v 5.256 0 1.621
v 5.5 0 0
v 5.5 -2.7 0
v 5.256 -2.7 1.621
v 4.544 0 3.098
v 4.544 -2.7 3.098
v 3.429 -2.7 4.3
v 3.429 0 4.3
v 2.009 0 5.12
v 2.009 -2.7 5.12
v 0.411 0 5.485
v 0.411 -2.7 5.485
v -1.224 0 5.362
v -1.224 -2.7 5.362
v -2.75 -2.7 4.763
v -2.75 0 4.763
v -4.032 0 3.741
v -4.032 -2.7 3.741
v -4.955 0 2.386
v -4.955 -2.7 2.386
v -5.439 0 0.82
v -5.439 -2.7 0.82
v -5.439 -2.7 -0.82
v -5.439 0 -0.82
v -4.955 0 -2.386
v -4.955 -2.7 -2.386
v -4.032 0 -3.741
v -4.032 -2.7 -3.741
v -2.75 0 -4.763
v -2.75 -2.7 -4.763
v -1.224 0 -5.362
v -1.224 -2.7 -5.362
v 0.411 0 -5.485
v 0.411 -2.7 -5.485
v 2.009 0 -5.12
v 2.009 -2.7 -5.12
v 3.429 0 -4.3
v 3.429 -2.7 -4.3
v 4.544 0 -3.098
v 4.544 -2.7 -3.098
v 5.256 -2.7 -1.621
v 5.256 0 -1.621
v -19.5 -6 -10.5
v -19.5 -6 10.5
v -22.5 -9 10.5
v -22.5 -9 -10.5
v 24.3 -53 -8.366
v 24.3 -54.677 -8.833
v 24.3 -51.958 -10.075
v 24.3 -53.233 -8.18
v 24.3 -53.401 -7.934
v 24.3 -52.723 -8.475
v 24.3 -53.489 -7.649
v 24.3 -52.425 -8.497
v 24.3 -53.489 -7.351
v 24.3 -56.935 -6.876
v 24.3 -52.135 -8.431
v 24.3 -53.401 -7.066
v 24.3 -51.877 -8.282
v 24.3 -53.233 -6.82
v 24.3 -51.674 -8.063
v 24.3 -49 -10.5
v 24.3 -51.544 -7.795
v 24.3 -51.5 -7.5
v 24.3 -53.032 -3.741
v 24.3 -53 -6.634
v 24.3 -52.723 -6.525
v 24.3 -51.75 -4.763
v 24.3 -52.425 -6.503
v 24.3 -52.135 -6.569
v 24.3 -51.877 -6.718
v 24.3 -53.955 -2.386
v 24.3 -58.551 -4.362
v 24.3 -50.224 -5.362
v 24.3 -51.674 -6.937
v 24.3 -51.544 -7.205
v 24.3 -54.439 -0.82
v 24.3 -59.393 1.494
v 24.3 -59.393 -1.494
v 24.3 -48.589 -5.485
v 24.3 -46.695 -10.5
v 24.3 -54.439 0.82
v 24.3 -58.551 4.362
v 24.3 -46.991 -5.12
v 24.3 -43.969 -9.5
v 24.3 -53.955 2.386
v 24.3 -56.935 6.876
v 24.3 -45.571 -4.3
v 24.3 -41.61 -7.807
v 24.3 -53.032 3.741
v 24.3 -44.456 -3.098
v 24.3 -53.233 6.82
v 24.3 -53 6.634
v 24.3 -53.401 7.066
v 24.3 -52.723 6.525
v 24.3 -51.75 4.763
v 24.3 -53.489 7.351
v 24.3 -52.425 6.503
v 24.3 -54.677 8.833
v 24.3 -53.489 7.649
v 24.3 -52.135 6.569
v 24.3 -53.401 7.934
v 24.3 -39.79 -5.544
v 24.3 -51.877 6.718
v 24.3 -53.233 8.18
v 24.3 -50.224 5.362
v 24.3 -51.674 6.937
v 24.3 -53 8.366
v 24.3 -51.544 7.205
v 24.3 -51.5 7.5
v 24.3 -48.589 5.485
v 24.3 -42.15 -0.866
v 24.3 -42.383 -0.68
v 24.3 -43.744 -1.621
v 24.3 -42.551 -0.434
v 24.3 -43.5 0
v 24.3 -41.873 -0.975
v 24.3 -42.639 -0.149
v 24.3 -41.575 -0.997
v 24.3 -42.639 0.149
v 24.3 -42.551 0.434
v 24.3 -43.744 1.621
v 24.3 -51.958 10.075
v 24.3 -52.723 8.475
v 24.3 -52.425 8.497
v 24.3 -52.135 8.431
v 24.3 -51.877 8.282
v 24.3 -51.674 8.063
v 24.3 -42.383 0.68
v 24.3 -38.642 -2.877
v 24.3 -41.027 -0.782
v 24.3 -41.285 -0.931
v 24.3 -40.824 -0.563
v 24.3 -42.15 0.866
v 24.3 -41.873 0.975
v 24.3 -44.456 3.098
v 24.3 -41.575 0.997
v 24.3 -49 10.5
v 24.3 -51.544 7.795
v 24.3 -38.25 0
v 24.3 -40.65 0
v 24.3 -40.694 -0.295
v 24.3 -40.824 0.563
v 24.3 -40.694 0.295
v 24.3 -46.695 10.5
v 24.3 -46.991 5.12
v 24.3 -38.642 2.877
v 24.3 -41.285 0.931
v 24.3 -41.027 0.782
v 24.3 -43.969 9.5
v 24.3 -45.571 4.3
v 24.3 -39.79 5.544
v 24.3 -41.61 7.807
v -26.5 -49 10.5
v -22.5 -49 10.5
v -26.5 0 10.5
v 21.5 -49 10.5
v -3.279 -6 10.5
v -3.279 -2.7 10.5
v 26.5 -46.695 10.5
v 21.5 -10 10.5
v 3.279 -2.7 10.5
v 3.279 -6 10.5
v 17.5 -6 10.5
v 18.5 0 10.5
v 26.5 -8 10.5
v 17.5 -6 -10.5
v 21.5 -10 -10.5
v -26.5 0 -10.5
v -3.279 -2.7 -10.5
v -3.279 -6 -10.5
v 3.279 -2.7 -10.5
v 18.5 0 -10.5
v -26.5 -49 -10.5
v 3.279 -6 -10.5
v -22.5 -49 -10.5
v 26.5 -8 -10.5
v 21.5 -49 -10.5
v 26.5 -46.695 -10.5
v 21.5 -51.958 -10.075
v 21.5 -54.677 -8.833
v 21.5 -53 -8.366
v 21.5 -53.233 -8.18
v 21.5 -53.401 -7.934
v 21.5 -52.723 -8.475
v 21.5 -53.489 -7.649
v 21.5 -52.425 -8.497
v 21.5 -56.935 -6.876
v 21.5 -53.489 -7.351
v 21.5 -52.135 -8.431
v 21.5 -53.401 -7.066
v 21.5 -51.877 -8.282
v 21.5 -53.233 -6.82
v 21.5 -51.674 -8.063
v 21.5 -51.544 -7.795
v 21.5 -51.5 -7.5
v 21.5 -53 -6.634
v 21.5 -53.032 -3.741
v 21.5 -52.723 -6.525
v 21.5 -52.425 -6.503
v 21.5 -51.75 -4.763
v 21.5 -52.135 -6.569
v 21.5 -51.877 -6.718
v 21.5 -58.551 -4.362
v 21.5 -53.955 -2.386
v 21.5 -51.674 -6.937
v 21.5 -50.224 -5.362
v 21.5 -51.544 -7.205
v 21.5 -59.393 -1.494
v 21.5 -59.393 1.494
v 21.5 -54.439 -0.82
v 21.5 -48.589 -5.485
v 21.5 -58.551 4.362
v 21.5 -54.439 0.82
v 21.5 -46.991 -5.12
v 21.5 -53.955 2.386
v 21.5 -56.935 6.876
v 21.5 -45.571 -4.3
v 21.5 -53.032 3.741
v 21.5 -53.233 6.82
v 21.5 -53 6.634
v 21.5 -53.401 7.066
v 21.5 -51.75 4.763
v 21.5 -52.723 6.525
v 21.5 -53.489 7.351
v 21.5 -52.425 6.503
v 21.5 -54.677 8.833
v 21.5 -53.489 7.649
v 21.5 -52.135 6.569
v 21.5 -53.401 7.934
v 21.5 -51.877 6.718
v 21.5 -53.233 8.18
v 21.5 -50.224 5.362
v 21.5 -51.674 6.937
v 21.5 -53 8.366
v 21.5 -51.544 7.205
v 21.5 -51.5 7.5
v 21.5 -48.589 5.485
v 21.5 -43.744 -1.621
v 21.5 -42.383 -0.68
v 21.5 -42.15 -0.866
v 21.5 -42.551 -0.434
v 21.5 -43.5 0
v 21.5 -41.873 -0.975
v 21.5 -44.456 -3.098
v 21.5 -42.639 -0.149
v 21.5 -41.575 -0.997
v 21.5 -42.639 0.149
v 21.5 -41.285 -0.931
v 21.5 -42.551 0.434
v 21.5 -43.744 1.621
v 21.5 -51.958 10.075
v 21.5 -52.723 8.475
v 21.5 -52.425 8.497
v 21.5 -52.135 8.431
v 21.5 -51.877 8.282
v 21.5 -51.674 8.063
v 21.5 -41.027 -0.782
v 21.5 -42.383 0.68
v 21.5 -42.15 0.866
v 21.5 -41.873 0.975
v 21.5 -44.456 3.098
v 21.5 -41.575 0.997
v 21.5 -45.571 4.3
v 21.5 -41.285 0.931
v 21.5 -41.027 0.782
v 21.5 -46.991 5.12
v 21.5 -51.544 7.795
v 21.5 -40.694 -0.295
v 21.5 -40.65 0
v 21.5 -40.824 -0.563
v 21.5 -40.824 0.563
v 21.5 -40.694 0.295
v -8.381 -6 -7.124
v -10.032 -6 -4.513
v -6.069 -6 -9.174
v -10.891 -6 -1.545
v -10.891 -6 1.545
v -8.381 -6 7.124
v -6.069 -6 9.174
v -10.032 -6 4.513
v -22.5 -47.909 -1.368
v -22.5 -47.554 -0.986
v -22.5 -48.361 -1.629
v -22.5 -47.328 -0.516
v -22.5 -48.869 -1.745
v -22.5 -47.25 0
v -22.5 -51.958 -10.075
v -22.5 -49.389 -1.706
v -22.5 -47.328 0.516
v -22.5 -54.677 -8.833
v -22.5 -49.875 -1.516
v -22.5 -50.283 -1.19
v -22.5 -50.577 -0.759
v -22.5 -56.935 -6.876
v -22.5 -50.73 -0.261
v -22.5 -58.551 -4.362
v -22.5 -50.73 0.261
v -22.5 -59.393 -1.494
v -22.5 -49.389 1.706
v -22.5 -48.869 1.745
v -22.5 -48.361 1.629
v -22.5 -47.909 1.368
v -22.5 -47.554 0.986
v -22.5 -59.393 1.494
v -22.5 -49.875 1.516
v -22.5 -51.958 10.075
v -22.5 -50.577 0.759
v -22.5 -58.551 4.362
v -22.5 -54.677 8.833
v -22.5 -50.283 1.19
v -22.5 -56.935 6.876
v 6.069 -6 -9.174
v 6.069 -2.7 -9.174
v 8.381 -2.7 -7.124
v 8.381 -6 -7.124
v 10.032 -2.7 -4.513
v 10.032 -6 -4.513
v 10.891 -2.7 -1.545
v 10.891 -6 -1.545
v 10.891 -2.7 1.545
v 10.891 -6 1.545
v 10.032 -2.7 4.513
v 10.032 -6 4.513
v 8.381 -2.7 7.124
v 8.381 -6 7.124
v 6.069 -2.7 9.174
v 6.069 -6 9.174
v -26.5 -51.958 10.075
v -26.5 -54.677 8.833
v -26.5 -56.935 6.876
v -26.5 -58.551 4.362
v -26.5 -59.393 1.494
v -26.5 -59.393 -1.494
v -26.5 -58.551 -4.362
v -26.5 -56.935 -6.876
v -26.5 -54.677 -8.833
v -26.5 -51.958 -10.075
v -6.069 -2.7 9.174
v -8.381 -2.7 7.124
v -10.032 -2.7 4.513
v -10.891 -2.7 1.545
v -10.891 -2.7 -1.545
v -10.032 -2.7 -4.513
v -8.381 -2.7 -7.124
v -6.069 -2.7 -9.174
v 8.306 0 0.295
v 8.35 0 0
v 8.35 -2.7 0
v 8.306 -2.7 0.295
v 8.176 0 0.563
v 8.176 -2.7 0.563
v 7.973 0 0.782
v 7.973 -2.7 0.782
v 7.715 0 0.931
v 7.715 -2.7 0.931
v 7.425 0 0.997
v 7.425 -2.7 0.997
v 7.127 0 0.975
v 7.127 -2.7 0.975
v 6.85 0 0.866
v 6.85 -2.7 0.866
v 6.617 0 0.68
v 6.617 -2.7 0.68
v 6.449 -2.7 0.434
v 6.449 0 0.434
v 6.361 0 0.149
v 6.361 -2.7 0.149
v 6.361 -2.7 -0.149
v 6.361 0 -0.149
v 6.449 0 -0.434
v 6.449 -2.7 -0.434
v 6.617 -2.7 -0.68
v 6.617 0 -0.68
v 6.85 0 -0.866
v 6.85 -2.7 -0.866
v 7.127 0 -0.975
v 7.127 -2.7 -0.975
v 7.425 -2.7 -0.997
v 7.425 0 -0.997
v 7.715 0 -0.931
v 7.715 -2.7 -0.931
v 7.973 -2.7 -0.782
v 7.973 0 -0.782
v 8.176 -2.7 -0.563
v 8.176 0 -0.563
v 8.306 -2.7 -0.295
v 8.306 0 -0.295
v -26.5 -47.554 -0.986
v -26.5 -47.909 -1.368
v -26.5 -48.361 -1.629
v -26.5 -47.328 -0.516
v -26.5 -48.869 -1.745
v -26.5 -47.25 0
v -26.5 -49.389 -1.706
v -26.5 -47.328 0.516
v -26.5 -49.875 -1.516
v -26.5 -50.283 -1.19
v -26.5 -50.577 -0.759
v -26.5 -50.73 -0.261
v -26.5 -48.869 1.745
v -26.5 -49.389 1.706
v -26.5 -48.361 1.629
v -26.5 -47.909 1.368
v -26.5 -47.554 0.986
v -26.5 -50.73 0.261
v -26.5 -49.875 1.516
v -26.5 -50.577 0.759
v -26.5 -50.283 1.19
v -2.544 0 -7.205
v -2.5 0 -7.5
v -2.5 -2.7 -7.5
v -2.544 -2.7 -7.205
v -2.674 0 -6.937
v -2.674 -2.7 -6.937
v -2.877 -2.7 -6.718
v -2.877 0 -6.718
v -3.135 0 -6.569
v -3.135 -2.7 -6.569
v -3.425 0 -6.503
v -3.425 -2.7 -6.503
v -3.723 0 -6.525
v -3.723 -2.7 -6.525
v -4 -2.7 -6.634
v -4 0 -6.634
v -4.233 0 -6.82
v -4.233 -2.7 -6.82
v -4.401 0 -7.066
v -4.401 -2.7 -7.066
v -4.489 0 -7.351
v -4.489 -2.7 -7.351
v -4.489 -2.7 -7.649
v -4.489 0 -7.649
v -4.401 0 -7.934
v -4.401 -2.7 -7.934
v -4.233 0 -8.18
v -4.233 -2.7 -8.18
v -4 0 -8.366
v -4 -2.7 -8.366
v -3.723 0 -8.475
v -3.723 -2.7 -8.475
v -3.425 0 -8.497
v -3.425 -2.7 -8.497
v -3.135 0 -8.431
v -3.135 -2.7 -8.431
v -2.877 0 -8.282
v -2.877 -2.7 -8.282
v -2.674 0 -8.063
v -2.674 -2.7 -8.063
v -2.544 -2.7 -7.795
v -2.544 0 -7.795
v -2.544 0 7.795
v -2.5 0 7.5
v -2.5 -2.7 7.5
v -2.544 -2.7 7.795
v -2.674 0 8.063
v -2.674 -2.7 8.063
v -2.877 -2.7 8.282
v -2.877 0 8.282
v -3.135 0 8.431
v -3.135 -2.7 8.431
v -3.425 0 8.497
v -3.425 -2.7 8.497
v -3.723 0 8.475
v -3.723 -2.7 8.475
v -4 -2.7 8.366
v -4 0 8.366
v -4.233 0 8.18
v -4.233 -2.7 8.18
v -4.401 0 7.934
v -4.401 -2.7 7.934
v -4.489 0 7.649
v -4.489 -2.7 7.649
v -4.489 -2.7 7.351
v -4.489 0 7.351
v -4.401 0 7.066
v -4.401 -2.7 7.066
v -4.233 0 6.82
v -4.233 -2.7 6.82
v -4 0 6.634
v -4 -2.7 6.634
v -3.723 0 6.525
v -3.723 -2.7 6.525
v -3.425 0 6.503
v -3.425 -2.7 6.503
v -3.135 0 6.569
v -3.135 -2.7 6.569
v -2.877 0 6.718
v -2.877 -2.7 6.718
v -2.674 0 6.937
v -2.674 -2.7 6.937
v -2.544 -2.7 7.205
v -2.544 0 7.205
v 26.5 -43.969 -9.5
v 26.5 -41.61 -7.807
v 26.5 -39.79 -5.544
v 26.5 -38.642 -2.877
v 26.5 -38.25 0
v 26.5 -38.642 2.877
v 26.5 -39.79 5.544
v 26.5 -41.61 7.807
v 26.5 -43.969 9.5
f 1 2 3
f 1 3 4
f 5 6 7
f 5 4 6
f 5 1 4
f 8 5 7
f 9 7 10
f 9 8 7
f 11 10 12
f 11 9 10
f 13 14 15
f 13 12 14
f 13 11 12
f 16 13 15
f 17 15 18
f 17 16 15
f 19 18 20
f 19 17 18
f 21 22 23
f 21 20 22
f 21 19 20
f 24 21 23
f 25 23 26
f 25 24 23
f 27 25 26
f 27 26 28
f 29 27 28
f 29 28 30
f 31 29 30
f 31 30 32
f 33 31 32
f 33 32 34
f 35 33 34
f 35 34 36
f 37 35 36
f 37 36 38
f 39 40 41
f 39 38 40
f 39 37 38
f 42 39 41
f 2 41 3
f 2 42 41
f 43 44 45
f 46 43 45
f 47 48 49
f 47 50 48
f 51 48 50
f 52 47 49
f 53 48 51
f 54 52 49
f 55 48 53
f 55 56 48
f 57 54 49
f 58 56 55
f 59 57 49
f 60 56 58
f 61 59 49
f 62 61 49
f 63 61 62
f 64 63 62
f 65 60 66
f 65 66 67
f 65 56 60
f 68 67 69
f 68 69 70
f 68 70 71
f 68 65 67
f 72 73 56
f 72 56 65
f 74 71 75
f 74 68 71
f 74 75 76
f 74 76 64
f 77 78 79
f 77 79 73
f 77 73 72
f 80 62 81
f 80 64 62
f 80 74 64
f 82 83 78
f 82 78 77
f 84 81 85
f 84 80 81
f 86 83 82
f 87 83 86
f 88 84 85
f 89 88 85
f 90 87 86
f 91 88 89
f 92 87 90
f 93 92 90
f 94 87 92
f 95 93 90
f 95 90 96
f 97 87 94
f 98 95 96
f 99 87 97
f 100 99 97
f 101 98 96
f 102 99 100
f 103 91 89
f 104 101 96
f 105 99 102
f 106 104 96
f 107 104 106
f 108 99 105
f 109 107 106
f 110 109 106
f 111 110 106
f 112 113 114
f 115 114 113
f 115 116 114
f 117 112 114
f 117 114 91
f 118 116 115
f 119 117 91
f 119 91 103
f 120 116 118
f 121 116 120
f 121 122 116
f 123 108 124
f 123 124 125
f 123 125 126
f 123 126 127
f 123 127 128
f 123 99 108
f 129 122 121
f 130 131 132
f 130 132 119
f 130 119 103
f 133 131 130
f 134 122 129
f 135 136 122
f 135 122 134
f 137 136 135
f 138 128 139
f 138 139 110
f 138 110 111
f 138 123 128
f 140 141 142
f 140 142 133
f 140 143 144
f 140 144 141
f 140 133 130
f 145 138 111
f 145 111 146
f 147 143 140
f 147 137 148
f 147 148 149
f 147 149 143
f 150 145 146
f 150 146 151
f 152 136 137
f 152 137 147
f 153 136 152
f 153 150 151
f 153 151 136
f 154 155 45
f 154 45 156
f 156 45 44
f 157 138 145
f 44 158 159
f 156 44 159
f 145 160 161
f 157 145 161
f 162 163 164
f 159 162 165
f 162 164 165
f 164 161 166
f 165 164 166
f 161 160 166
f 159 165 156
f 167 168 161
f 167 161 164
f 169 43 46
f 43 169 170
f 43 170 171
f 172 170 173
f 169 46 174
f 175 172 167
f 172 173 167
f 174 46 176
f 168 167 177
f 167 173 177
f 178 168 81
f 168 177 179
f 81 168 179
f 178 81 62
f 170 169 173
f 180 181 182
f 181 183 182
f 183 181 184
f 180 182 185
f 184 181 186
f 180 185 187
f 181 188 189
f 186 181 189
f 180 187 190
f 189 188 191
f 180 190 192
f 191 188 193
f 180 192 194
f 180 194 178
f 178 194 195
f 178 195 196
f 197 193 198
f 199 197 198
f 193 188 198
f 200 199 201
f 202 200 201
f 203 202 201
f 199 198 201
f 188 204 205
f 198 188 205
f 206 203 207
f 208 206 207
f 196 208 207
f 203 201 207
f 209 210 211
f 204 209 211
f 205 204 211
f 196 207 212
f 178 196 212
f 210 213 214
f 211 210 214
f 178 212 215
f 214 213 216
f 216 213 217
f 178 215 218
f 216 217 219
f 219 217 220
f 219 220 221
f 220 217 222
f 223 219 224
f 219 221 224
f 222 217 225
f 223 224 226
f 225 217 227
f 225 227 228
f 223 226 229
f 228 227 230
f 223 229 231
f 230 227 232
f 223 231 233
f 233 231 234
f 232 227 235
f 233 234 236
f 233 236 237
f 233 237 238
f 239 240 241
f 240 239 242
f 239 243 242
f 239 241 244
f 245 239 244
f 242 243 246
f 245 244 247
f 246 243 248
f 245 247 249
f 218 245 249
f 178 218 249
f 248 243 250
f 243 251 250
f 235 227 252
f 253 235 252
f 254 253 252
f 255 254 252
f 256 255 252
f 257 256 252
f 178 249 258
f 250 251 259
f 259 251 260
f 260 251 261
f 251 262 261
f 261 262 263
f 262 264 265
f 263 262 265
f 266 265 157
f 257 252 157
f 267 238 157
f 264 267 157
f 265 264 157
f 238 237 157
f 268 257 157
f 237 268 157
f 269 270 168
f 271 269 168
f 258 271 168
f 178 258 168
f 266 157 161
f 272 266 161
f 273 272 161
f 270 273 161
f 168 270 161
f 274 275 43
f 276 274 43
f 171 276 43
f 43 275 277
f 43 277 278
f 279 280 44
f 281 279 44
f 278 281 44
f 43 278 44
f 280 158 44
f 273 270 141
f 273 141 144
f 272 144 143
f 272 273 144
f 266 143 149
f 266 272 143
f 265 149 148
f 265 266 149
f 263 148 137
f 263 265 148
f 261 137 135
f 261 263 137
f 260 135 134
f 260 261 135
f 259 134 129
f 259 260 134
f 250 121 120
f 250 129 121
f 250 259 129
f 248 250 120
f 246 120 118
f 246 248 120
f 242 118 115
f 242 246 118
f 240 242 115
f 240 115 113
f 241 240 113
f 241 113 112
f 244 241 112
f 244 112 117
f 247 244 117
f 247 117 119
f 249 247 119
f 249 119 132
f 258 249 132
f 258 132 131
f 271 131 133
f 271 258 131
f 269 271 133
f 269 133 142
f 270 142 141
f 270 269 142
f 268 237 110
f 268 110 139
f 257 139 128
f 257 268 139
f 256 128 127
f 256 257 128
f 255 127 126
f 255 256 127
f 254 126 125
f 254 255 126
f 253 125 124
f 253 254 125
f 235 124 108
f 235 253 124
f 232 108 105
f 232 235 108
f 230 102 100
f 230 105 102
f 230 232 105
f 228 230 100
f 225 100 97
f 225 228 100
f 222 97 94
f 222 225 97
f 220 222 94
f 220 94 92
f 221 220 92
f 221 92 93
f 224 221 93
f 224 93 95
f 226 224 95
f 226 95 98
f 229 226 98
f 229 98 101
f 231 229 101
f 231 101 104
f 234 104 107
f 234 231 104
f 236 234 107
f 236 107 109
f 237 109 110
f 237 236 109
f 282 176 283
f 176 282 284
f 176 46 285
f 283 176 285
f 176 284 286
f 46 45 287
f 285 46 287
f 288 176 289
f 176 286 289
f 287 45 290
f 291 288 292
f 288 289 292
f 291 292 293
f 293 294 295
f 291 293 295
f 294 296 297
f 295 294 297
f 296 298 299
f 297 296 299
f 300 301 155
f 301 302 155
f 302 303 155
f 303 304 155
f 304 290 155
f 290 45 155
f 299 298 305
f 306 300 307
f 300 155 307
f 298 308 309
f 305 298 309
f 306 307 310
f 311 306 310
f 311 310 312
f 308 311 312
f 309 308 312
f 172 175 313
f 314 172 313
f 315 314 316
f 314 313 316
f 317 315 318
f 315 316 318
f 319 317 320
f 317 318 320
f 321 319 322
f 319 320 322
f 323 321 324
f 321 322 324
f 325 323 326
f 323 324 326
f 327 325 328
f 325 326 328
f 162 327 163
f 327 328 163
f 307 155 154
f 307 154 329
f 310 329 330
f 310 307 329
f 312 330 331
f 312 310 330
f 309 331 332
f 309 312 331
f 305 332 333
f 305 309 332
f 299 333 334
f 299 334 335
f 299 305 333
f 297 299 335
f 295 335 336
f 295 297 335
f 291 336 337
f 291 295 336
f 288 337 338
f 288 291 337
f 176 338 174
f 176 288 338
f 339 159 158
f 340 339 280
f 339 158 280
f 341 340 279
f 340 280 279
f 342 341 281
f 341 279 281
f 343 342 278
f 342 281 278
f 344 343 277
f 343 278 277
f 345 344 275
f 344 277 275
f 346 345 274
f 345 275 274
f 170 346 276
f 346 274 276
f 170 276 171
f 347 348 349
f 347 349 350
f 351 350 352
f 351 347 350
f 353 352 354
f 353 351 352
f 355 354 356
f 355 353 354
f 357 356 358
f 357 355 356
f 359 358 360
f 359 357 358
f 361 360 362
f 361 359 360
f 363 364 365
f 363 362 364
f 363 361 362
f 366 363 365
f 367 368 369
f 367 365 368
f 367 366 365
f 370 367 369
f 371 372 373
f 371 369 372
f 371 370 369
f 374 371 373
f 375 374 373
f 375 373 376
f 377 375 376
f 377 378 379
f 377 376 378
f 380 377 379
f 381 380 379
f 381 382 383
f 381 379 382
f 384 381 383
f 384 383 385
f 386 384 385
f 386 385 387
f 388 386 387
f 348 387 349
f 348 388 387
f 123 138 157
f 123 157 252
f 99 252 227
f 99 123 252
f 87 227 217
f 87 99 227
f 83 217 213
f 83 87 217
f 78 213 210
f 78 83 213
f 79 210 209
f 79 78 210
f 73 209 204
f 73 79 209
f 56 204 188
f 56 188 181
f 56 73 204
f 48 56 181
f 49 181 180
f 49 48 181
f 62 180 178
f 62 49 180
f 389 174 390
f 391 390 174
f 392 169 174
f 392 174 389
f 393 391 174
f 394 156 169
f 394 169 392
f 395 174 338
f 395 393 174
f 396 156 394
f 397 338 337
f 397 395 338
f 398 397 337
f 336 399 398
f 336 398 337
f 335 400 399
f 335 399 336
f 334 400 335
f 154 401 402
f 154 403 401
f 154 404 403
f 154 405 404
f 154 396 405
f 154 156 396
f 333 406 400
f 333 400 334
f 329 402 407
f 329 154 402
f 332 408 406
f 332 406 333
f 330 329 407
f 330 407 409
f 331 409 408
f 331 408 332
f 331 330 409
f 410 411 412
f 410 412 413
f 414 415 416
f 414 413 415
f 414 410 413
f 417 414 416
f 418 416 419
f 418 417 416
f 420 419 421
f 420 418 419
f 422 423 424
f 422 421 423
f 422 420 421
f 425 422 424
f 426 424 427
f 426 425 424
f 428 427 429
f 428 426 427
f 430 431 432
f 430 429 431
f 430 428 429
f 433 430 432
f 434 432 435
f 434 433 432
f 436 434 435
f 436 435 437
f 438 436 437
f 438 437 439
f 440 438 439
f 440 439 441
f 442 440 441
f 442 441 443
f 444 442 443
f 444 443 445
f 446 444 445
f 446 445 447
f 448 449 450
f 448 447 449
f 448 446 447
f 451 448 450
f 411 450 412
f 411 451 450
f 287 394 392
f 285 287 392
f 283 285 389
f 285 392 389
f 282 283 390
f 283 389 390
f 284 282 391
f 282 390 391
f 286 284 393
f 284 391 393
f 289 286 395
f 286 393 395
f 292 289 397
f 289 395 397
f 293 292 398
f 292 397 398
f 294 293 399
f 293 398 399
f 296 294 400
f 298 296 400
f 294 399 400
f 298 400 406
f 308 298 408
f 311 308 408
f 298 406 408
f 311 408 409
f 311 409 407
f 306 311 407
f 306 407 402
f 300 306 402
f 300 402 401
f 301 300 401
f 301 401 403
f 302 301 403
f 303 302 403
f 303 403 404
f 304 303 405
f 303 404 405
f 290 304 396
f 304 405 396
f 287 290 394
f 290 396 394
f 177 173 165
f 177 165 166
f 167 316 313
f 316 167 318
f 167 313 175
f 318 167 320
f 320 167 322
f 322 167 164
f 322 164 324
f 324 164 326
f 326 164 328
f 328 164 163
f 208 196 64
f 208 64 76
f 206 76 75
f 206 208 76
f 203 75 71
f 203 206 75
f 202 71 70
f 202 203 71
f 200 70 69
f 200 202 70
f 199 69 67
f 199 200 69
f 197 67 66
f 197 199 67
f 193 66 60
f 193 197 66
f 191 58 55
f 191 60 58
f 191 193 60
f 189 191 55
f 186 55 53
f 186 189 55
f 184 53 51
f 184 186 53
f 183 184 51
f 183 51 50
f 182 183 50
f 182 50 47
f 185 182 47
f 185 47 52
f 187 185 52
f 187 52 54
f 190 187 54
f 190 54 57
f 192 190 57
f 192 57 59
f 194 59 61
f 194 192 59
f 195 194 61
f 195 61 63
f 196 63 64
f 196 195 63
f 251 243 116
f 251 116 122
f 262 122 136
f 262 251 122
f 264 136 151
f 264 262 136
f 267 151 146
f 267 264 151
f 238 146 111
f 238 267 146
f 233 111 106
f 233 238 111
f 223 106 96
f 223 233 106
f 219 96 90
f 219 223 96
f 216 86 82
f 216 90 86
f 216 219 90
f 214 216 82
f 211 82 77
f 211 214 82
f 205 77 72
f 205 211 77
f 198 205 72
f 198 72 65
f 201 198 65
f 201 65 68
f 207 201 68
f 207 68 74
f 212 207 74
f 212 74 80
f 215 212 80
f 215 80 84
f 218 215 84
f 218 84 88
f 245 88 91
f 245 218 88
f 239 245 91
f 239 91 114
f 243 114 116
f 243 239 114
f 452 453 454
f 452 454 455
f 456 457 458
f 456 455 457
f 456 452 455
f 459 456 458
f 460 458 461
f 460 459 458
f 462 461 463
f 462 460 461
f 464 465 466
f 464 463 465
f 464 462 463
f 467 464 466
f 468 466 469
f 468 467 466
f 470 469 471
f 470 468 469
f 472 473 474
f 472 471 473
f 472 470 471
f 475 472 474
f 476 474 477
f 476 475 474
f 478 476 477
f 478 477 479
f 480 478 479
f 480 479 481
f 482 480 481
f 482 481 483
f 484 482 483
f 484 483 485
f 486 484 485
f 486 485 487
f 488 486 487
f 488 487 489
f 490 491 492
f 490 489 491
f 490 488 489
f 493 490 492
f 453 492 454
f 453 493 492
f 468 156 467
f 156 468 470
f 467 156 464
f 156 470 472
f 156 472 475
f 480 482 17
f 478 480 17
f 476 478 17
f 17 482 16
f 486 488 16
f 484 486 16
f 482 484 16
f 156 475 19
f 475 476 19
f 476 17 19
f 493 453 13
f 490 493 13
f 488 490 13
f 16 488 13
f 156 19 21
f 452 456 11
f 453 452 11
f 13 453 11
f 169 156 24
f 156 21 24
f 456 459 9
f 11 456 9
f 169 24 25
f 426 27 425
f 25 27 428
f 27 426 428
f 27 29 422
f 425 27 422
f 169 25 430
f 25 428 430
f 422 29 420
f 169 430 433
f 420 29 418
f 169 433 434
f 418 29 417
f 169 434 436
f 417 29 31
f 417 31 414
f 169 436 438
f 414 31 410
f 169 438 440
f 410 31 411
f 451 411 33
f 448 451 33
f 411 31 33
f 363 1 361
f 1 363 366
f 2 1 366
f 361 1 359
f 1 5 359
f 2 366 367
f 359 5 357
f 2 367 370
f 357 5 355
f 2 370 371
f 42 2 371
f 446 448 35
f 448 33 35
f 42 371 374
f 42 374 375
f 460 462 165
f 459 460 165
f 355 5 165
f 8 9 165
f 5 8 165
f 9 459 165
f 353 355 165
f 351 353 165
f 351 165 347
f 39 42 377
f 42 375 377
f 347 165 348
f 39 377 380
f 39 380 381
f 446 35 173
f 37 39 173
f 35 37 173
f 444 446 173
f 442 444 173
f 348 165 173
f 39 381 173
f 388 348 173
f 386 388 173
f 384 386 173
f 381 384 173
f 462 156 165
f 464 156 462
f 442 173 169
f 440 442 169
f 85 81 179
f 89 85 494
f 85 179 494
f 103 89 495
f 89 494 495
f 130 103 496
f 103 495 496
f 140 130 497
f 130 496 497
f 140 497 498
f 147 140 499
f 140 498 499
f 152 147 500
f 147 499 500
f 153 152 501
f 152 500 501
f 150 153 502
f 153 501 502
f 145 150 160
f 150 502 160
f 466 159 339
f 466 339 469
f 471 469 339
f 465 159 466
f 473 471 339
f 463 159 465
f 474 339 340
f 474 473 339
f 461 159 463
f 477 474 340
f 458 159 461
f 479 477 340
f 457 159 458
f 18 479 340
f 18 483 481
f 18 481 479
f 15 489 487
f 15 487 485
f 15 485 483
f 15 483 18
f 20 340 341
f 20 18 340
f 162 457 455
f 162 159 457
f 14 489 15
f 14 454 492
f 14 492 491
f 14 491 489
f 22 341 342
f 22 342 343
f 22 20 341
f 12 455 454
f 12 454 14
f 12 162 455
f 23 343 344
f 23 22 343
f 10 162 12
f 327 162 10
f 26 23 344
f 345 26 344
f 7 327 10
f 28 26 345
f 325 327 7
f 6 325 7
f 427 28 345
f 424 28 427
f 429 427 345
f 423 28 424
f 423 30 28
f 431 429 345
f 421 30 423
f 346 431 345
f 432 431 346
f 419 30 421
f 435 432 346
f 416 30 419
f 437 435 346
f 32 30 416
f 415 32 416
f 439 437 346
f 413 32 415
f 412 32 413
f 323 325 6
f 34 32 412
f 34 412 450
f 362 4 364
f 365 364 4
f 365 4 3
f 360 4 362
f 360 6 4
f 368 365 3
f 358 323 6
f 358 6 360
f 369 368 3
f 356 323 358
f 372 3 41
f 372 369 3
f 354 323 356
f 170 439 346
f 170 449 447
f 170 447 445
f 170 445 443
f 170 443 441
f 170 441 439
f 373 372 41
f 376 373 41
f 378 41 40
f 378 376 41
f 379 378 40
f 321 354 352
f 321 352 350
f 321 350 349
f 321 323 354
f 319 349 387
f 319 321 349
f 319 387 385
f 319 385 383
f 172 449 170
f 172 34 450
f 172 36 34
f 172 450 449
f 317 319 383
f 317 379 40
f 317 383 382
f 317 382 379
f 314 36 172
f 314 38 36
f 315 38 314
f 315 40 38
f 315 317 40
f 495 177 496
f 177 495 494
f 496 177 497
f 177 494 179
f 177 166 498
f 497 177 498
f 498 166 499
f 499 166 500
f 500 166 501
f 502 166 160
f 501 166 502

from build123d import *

# Parameters (mm, degrees)
CYLINDER055_R            = 1
CYLINDER055_DEPTH        = 20
CYLINDER055_ROLL_ANGLE   = 90
CYLINDER054_R            = 5.5
CYLINDER054_DEPTH        = 20
CYLINDER054_ROLL_ANGLE   = 90
CLONE003_PLACEMENT_ANGLE = 90
PAD001_DEPTH             = 26.5
POCKET_DEPTH             = 21.001
SKETCH003_R              = 10.75
POCKET001_DEPTH          = 2.2
SKETCH004_R              = 1.75
POCKET002_DEPTH          = 4
SKETCH005_R              = 11
POCKET003_DEPTH          = 3.3
POCKET004_DEPTH          = 21.001


with BuildPart() as servo_horn_small_drill_master:
    # Cylinder055 → Cylinder055 (new body)
    with BuildSketch(Plane.XY):
        Circle(CYLINDER055_R)
    extrude(amount=CYLINDER055_DEPTH)


with BuildPart() as servo_horn_small_drill_master_1:
    # Cylinder055 roll: moved
    add(servo_horn_small_drill_master.part.rotate(Axis((0, 0, 0), (1, 0, 0)), CYLINDER055_ROLL_ANGLE))


with BuildPart() as servo_horn_small_drill_master_2:
    # Cylinder055 placement: moved
    add(servo_horn_small_drill_master_1.part.moved(Location((-3.5, 10, 7.5))))


with BuildPart() as clone002:
    # Clone002 base: copy of servo-horn-small-drill-master
    add(servo_horn_small_drill_master_2.part)


with BuildPart() as clone002_1:
    # Clone002 placement: moved
    add(clone002.part.moved(Location((0, -4e-06, -15.000002))))


with BuildPart() as servo_shaft_drill:
    # Cylinder054 → Cylinder054 (new body)
    with BuildSketch(Plane.XY):
        Circle(CYLINDER054_R)
    extrude(amount=CYLINDER054_DEPTH)


with BuildPart() as servo_shaft_drill_1:
    # Cylinder054 roll: moved
    add(servo_shaft_drill.part.rotate(Axis((0, 0, 0), (1, 0, 0)), CYLINDER054_ROLL_ANGLE))


with BuildPart() as servo_shaft_drill_2:
    # Cylinder054 placement: moved
    add(servo_shaft_drill_1.part.moved(Location((0, 10, 0))))


with BuildPart() as servo_drills_block1_master:
    # Clone001 base: copy of servo-horn-small-drill-master
    add(servo_horn_small_drill_master_2.part)


with BuildPart() as servo_drills_block1_master_1:
    # Clone001 placement: moved
    add(servo_drills_block1_master.part.moved(Location((10.85, -2e-06, -7.500002))))

    # Fusion041: union Clone002, servo-horn-small-drill-master, servo-shaft-drill
    add(clone002_1.part)
    add(servo_horn_small_drill_master_2.part)
    add(servo_shaft_drill_2.part)


with BuildPart() as clone_of_servo_drills_block1_master:
    # Clone003 base: copy of servo-Drills-block1-master
    add(servo_drills_block1_master_1.part)


with BuildPart() as clone_of_servo_drills_block1_master_1:
    # Clone003 placement: moved
    add(clone_of_servo_drills_block1_master.part.moved(Location((22, -49, 7e-06))).rotate(Axis((22, -49, 7e-06), (0, 0, 1)), CLONE003_PLACEMENT_ANGLE))


with BuildPart() as servo_horn_drills:
    # Fusion042 base: copy of servo-Drills-block1-master
    add(servo_drills_block1_master_1.part)

    # Fusion042: union Clone of servo-Drills-block1-master
    add(clone_of_servo_drills_block1_master_1.part)


with BuildPart() as leg:
    # Sketch001 → Pad001 (new body, symmetric)
    with BuildSketch(Plane.YZ):
        with BuildLine():
            Line((-49, 10.5), (0, 10.5))
            Line((0, 10.5), (0, -10.5))
            Line((0, -10.5), (-49, -10.5))
            ThreePointArc((-49, 10.5), (-59.5, 0), (-49, -10.5))
        make_face()
    extrude(amount=PAD001_DEPTH, both=True)

    # Sketch002 → Pocket (cut, through all)
    with BuildSketch(Plane(origin=(0, 0, 10.5), x_dir=(0, -1, 0), z_dir=(0, 0, 1))):
        Polygon((64, 21.5), (10, 21.5), (6, 17.5), (6, -19.5), (9, -22.5), (64, -22.5), align=None)
    extrude(amount=-POCKET_DEPTH, mode=Mode.SUBTRACT)

    # Sketch003 → Pocket001 (cut)
    with BuildSketch(Plane.YZ.offset(26.5)):
        with Locations((-49, 0)):
            Circle(SKETCH003_R)
    extrude(amount=-POCKET001_DEPTH, mode=Mode.SUBTRACT)

    # Sketch004 → Pocket002 (cut)
    with BuildSketch(Plane(origin=(-26.5, 0, 0), x_dir=(0, 1, 0), z_dir=(-1, 0, 0))):
        with Locations((-49, 0)):
            Circle(SKETCH004_R)
    extrude(amount=-POCKET002_DEPTH, mode=Mode.SUBTRACT)

    # Sketch005 → Pocket003 (cut)
    with BuildSketch(Plane(origin=(0, -6, 0), x_dir=(0, 0, -1), z_dir=(0, -1, 0))):
        Circle(SKETCH005_R)
    extrude(amount=-POCKET003_DEPTH, mode=Mode.SUBTRACT)

    # Sketch006 → Pocket004 (cut, through all)
    with BuildSketch(Plane(origin=(0, 0, 10.5), x_dir=(0, -1, 0), z_dir=(0, 0, 1))):
        Polygon((0, 18.5), (8, 26.5), (0, 26.5), align=None)
    extrude(amount=-POCKET004_DEPTH, mode=Mode.SUBTRACT)

    # Cut070: cut Servo-horn-drills
    add(servo_horn_drills.part, mode=Mode.SUBTRACT)


solid = leg.part
